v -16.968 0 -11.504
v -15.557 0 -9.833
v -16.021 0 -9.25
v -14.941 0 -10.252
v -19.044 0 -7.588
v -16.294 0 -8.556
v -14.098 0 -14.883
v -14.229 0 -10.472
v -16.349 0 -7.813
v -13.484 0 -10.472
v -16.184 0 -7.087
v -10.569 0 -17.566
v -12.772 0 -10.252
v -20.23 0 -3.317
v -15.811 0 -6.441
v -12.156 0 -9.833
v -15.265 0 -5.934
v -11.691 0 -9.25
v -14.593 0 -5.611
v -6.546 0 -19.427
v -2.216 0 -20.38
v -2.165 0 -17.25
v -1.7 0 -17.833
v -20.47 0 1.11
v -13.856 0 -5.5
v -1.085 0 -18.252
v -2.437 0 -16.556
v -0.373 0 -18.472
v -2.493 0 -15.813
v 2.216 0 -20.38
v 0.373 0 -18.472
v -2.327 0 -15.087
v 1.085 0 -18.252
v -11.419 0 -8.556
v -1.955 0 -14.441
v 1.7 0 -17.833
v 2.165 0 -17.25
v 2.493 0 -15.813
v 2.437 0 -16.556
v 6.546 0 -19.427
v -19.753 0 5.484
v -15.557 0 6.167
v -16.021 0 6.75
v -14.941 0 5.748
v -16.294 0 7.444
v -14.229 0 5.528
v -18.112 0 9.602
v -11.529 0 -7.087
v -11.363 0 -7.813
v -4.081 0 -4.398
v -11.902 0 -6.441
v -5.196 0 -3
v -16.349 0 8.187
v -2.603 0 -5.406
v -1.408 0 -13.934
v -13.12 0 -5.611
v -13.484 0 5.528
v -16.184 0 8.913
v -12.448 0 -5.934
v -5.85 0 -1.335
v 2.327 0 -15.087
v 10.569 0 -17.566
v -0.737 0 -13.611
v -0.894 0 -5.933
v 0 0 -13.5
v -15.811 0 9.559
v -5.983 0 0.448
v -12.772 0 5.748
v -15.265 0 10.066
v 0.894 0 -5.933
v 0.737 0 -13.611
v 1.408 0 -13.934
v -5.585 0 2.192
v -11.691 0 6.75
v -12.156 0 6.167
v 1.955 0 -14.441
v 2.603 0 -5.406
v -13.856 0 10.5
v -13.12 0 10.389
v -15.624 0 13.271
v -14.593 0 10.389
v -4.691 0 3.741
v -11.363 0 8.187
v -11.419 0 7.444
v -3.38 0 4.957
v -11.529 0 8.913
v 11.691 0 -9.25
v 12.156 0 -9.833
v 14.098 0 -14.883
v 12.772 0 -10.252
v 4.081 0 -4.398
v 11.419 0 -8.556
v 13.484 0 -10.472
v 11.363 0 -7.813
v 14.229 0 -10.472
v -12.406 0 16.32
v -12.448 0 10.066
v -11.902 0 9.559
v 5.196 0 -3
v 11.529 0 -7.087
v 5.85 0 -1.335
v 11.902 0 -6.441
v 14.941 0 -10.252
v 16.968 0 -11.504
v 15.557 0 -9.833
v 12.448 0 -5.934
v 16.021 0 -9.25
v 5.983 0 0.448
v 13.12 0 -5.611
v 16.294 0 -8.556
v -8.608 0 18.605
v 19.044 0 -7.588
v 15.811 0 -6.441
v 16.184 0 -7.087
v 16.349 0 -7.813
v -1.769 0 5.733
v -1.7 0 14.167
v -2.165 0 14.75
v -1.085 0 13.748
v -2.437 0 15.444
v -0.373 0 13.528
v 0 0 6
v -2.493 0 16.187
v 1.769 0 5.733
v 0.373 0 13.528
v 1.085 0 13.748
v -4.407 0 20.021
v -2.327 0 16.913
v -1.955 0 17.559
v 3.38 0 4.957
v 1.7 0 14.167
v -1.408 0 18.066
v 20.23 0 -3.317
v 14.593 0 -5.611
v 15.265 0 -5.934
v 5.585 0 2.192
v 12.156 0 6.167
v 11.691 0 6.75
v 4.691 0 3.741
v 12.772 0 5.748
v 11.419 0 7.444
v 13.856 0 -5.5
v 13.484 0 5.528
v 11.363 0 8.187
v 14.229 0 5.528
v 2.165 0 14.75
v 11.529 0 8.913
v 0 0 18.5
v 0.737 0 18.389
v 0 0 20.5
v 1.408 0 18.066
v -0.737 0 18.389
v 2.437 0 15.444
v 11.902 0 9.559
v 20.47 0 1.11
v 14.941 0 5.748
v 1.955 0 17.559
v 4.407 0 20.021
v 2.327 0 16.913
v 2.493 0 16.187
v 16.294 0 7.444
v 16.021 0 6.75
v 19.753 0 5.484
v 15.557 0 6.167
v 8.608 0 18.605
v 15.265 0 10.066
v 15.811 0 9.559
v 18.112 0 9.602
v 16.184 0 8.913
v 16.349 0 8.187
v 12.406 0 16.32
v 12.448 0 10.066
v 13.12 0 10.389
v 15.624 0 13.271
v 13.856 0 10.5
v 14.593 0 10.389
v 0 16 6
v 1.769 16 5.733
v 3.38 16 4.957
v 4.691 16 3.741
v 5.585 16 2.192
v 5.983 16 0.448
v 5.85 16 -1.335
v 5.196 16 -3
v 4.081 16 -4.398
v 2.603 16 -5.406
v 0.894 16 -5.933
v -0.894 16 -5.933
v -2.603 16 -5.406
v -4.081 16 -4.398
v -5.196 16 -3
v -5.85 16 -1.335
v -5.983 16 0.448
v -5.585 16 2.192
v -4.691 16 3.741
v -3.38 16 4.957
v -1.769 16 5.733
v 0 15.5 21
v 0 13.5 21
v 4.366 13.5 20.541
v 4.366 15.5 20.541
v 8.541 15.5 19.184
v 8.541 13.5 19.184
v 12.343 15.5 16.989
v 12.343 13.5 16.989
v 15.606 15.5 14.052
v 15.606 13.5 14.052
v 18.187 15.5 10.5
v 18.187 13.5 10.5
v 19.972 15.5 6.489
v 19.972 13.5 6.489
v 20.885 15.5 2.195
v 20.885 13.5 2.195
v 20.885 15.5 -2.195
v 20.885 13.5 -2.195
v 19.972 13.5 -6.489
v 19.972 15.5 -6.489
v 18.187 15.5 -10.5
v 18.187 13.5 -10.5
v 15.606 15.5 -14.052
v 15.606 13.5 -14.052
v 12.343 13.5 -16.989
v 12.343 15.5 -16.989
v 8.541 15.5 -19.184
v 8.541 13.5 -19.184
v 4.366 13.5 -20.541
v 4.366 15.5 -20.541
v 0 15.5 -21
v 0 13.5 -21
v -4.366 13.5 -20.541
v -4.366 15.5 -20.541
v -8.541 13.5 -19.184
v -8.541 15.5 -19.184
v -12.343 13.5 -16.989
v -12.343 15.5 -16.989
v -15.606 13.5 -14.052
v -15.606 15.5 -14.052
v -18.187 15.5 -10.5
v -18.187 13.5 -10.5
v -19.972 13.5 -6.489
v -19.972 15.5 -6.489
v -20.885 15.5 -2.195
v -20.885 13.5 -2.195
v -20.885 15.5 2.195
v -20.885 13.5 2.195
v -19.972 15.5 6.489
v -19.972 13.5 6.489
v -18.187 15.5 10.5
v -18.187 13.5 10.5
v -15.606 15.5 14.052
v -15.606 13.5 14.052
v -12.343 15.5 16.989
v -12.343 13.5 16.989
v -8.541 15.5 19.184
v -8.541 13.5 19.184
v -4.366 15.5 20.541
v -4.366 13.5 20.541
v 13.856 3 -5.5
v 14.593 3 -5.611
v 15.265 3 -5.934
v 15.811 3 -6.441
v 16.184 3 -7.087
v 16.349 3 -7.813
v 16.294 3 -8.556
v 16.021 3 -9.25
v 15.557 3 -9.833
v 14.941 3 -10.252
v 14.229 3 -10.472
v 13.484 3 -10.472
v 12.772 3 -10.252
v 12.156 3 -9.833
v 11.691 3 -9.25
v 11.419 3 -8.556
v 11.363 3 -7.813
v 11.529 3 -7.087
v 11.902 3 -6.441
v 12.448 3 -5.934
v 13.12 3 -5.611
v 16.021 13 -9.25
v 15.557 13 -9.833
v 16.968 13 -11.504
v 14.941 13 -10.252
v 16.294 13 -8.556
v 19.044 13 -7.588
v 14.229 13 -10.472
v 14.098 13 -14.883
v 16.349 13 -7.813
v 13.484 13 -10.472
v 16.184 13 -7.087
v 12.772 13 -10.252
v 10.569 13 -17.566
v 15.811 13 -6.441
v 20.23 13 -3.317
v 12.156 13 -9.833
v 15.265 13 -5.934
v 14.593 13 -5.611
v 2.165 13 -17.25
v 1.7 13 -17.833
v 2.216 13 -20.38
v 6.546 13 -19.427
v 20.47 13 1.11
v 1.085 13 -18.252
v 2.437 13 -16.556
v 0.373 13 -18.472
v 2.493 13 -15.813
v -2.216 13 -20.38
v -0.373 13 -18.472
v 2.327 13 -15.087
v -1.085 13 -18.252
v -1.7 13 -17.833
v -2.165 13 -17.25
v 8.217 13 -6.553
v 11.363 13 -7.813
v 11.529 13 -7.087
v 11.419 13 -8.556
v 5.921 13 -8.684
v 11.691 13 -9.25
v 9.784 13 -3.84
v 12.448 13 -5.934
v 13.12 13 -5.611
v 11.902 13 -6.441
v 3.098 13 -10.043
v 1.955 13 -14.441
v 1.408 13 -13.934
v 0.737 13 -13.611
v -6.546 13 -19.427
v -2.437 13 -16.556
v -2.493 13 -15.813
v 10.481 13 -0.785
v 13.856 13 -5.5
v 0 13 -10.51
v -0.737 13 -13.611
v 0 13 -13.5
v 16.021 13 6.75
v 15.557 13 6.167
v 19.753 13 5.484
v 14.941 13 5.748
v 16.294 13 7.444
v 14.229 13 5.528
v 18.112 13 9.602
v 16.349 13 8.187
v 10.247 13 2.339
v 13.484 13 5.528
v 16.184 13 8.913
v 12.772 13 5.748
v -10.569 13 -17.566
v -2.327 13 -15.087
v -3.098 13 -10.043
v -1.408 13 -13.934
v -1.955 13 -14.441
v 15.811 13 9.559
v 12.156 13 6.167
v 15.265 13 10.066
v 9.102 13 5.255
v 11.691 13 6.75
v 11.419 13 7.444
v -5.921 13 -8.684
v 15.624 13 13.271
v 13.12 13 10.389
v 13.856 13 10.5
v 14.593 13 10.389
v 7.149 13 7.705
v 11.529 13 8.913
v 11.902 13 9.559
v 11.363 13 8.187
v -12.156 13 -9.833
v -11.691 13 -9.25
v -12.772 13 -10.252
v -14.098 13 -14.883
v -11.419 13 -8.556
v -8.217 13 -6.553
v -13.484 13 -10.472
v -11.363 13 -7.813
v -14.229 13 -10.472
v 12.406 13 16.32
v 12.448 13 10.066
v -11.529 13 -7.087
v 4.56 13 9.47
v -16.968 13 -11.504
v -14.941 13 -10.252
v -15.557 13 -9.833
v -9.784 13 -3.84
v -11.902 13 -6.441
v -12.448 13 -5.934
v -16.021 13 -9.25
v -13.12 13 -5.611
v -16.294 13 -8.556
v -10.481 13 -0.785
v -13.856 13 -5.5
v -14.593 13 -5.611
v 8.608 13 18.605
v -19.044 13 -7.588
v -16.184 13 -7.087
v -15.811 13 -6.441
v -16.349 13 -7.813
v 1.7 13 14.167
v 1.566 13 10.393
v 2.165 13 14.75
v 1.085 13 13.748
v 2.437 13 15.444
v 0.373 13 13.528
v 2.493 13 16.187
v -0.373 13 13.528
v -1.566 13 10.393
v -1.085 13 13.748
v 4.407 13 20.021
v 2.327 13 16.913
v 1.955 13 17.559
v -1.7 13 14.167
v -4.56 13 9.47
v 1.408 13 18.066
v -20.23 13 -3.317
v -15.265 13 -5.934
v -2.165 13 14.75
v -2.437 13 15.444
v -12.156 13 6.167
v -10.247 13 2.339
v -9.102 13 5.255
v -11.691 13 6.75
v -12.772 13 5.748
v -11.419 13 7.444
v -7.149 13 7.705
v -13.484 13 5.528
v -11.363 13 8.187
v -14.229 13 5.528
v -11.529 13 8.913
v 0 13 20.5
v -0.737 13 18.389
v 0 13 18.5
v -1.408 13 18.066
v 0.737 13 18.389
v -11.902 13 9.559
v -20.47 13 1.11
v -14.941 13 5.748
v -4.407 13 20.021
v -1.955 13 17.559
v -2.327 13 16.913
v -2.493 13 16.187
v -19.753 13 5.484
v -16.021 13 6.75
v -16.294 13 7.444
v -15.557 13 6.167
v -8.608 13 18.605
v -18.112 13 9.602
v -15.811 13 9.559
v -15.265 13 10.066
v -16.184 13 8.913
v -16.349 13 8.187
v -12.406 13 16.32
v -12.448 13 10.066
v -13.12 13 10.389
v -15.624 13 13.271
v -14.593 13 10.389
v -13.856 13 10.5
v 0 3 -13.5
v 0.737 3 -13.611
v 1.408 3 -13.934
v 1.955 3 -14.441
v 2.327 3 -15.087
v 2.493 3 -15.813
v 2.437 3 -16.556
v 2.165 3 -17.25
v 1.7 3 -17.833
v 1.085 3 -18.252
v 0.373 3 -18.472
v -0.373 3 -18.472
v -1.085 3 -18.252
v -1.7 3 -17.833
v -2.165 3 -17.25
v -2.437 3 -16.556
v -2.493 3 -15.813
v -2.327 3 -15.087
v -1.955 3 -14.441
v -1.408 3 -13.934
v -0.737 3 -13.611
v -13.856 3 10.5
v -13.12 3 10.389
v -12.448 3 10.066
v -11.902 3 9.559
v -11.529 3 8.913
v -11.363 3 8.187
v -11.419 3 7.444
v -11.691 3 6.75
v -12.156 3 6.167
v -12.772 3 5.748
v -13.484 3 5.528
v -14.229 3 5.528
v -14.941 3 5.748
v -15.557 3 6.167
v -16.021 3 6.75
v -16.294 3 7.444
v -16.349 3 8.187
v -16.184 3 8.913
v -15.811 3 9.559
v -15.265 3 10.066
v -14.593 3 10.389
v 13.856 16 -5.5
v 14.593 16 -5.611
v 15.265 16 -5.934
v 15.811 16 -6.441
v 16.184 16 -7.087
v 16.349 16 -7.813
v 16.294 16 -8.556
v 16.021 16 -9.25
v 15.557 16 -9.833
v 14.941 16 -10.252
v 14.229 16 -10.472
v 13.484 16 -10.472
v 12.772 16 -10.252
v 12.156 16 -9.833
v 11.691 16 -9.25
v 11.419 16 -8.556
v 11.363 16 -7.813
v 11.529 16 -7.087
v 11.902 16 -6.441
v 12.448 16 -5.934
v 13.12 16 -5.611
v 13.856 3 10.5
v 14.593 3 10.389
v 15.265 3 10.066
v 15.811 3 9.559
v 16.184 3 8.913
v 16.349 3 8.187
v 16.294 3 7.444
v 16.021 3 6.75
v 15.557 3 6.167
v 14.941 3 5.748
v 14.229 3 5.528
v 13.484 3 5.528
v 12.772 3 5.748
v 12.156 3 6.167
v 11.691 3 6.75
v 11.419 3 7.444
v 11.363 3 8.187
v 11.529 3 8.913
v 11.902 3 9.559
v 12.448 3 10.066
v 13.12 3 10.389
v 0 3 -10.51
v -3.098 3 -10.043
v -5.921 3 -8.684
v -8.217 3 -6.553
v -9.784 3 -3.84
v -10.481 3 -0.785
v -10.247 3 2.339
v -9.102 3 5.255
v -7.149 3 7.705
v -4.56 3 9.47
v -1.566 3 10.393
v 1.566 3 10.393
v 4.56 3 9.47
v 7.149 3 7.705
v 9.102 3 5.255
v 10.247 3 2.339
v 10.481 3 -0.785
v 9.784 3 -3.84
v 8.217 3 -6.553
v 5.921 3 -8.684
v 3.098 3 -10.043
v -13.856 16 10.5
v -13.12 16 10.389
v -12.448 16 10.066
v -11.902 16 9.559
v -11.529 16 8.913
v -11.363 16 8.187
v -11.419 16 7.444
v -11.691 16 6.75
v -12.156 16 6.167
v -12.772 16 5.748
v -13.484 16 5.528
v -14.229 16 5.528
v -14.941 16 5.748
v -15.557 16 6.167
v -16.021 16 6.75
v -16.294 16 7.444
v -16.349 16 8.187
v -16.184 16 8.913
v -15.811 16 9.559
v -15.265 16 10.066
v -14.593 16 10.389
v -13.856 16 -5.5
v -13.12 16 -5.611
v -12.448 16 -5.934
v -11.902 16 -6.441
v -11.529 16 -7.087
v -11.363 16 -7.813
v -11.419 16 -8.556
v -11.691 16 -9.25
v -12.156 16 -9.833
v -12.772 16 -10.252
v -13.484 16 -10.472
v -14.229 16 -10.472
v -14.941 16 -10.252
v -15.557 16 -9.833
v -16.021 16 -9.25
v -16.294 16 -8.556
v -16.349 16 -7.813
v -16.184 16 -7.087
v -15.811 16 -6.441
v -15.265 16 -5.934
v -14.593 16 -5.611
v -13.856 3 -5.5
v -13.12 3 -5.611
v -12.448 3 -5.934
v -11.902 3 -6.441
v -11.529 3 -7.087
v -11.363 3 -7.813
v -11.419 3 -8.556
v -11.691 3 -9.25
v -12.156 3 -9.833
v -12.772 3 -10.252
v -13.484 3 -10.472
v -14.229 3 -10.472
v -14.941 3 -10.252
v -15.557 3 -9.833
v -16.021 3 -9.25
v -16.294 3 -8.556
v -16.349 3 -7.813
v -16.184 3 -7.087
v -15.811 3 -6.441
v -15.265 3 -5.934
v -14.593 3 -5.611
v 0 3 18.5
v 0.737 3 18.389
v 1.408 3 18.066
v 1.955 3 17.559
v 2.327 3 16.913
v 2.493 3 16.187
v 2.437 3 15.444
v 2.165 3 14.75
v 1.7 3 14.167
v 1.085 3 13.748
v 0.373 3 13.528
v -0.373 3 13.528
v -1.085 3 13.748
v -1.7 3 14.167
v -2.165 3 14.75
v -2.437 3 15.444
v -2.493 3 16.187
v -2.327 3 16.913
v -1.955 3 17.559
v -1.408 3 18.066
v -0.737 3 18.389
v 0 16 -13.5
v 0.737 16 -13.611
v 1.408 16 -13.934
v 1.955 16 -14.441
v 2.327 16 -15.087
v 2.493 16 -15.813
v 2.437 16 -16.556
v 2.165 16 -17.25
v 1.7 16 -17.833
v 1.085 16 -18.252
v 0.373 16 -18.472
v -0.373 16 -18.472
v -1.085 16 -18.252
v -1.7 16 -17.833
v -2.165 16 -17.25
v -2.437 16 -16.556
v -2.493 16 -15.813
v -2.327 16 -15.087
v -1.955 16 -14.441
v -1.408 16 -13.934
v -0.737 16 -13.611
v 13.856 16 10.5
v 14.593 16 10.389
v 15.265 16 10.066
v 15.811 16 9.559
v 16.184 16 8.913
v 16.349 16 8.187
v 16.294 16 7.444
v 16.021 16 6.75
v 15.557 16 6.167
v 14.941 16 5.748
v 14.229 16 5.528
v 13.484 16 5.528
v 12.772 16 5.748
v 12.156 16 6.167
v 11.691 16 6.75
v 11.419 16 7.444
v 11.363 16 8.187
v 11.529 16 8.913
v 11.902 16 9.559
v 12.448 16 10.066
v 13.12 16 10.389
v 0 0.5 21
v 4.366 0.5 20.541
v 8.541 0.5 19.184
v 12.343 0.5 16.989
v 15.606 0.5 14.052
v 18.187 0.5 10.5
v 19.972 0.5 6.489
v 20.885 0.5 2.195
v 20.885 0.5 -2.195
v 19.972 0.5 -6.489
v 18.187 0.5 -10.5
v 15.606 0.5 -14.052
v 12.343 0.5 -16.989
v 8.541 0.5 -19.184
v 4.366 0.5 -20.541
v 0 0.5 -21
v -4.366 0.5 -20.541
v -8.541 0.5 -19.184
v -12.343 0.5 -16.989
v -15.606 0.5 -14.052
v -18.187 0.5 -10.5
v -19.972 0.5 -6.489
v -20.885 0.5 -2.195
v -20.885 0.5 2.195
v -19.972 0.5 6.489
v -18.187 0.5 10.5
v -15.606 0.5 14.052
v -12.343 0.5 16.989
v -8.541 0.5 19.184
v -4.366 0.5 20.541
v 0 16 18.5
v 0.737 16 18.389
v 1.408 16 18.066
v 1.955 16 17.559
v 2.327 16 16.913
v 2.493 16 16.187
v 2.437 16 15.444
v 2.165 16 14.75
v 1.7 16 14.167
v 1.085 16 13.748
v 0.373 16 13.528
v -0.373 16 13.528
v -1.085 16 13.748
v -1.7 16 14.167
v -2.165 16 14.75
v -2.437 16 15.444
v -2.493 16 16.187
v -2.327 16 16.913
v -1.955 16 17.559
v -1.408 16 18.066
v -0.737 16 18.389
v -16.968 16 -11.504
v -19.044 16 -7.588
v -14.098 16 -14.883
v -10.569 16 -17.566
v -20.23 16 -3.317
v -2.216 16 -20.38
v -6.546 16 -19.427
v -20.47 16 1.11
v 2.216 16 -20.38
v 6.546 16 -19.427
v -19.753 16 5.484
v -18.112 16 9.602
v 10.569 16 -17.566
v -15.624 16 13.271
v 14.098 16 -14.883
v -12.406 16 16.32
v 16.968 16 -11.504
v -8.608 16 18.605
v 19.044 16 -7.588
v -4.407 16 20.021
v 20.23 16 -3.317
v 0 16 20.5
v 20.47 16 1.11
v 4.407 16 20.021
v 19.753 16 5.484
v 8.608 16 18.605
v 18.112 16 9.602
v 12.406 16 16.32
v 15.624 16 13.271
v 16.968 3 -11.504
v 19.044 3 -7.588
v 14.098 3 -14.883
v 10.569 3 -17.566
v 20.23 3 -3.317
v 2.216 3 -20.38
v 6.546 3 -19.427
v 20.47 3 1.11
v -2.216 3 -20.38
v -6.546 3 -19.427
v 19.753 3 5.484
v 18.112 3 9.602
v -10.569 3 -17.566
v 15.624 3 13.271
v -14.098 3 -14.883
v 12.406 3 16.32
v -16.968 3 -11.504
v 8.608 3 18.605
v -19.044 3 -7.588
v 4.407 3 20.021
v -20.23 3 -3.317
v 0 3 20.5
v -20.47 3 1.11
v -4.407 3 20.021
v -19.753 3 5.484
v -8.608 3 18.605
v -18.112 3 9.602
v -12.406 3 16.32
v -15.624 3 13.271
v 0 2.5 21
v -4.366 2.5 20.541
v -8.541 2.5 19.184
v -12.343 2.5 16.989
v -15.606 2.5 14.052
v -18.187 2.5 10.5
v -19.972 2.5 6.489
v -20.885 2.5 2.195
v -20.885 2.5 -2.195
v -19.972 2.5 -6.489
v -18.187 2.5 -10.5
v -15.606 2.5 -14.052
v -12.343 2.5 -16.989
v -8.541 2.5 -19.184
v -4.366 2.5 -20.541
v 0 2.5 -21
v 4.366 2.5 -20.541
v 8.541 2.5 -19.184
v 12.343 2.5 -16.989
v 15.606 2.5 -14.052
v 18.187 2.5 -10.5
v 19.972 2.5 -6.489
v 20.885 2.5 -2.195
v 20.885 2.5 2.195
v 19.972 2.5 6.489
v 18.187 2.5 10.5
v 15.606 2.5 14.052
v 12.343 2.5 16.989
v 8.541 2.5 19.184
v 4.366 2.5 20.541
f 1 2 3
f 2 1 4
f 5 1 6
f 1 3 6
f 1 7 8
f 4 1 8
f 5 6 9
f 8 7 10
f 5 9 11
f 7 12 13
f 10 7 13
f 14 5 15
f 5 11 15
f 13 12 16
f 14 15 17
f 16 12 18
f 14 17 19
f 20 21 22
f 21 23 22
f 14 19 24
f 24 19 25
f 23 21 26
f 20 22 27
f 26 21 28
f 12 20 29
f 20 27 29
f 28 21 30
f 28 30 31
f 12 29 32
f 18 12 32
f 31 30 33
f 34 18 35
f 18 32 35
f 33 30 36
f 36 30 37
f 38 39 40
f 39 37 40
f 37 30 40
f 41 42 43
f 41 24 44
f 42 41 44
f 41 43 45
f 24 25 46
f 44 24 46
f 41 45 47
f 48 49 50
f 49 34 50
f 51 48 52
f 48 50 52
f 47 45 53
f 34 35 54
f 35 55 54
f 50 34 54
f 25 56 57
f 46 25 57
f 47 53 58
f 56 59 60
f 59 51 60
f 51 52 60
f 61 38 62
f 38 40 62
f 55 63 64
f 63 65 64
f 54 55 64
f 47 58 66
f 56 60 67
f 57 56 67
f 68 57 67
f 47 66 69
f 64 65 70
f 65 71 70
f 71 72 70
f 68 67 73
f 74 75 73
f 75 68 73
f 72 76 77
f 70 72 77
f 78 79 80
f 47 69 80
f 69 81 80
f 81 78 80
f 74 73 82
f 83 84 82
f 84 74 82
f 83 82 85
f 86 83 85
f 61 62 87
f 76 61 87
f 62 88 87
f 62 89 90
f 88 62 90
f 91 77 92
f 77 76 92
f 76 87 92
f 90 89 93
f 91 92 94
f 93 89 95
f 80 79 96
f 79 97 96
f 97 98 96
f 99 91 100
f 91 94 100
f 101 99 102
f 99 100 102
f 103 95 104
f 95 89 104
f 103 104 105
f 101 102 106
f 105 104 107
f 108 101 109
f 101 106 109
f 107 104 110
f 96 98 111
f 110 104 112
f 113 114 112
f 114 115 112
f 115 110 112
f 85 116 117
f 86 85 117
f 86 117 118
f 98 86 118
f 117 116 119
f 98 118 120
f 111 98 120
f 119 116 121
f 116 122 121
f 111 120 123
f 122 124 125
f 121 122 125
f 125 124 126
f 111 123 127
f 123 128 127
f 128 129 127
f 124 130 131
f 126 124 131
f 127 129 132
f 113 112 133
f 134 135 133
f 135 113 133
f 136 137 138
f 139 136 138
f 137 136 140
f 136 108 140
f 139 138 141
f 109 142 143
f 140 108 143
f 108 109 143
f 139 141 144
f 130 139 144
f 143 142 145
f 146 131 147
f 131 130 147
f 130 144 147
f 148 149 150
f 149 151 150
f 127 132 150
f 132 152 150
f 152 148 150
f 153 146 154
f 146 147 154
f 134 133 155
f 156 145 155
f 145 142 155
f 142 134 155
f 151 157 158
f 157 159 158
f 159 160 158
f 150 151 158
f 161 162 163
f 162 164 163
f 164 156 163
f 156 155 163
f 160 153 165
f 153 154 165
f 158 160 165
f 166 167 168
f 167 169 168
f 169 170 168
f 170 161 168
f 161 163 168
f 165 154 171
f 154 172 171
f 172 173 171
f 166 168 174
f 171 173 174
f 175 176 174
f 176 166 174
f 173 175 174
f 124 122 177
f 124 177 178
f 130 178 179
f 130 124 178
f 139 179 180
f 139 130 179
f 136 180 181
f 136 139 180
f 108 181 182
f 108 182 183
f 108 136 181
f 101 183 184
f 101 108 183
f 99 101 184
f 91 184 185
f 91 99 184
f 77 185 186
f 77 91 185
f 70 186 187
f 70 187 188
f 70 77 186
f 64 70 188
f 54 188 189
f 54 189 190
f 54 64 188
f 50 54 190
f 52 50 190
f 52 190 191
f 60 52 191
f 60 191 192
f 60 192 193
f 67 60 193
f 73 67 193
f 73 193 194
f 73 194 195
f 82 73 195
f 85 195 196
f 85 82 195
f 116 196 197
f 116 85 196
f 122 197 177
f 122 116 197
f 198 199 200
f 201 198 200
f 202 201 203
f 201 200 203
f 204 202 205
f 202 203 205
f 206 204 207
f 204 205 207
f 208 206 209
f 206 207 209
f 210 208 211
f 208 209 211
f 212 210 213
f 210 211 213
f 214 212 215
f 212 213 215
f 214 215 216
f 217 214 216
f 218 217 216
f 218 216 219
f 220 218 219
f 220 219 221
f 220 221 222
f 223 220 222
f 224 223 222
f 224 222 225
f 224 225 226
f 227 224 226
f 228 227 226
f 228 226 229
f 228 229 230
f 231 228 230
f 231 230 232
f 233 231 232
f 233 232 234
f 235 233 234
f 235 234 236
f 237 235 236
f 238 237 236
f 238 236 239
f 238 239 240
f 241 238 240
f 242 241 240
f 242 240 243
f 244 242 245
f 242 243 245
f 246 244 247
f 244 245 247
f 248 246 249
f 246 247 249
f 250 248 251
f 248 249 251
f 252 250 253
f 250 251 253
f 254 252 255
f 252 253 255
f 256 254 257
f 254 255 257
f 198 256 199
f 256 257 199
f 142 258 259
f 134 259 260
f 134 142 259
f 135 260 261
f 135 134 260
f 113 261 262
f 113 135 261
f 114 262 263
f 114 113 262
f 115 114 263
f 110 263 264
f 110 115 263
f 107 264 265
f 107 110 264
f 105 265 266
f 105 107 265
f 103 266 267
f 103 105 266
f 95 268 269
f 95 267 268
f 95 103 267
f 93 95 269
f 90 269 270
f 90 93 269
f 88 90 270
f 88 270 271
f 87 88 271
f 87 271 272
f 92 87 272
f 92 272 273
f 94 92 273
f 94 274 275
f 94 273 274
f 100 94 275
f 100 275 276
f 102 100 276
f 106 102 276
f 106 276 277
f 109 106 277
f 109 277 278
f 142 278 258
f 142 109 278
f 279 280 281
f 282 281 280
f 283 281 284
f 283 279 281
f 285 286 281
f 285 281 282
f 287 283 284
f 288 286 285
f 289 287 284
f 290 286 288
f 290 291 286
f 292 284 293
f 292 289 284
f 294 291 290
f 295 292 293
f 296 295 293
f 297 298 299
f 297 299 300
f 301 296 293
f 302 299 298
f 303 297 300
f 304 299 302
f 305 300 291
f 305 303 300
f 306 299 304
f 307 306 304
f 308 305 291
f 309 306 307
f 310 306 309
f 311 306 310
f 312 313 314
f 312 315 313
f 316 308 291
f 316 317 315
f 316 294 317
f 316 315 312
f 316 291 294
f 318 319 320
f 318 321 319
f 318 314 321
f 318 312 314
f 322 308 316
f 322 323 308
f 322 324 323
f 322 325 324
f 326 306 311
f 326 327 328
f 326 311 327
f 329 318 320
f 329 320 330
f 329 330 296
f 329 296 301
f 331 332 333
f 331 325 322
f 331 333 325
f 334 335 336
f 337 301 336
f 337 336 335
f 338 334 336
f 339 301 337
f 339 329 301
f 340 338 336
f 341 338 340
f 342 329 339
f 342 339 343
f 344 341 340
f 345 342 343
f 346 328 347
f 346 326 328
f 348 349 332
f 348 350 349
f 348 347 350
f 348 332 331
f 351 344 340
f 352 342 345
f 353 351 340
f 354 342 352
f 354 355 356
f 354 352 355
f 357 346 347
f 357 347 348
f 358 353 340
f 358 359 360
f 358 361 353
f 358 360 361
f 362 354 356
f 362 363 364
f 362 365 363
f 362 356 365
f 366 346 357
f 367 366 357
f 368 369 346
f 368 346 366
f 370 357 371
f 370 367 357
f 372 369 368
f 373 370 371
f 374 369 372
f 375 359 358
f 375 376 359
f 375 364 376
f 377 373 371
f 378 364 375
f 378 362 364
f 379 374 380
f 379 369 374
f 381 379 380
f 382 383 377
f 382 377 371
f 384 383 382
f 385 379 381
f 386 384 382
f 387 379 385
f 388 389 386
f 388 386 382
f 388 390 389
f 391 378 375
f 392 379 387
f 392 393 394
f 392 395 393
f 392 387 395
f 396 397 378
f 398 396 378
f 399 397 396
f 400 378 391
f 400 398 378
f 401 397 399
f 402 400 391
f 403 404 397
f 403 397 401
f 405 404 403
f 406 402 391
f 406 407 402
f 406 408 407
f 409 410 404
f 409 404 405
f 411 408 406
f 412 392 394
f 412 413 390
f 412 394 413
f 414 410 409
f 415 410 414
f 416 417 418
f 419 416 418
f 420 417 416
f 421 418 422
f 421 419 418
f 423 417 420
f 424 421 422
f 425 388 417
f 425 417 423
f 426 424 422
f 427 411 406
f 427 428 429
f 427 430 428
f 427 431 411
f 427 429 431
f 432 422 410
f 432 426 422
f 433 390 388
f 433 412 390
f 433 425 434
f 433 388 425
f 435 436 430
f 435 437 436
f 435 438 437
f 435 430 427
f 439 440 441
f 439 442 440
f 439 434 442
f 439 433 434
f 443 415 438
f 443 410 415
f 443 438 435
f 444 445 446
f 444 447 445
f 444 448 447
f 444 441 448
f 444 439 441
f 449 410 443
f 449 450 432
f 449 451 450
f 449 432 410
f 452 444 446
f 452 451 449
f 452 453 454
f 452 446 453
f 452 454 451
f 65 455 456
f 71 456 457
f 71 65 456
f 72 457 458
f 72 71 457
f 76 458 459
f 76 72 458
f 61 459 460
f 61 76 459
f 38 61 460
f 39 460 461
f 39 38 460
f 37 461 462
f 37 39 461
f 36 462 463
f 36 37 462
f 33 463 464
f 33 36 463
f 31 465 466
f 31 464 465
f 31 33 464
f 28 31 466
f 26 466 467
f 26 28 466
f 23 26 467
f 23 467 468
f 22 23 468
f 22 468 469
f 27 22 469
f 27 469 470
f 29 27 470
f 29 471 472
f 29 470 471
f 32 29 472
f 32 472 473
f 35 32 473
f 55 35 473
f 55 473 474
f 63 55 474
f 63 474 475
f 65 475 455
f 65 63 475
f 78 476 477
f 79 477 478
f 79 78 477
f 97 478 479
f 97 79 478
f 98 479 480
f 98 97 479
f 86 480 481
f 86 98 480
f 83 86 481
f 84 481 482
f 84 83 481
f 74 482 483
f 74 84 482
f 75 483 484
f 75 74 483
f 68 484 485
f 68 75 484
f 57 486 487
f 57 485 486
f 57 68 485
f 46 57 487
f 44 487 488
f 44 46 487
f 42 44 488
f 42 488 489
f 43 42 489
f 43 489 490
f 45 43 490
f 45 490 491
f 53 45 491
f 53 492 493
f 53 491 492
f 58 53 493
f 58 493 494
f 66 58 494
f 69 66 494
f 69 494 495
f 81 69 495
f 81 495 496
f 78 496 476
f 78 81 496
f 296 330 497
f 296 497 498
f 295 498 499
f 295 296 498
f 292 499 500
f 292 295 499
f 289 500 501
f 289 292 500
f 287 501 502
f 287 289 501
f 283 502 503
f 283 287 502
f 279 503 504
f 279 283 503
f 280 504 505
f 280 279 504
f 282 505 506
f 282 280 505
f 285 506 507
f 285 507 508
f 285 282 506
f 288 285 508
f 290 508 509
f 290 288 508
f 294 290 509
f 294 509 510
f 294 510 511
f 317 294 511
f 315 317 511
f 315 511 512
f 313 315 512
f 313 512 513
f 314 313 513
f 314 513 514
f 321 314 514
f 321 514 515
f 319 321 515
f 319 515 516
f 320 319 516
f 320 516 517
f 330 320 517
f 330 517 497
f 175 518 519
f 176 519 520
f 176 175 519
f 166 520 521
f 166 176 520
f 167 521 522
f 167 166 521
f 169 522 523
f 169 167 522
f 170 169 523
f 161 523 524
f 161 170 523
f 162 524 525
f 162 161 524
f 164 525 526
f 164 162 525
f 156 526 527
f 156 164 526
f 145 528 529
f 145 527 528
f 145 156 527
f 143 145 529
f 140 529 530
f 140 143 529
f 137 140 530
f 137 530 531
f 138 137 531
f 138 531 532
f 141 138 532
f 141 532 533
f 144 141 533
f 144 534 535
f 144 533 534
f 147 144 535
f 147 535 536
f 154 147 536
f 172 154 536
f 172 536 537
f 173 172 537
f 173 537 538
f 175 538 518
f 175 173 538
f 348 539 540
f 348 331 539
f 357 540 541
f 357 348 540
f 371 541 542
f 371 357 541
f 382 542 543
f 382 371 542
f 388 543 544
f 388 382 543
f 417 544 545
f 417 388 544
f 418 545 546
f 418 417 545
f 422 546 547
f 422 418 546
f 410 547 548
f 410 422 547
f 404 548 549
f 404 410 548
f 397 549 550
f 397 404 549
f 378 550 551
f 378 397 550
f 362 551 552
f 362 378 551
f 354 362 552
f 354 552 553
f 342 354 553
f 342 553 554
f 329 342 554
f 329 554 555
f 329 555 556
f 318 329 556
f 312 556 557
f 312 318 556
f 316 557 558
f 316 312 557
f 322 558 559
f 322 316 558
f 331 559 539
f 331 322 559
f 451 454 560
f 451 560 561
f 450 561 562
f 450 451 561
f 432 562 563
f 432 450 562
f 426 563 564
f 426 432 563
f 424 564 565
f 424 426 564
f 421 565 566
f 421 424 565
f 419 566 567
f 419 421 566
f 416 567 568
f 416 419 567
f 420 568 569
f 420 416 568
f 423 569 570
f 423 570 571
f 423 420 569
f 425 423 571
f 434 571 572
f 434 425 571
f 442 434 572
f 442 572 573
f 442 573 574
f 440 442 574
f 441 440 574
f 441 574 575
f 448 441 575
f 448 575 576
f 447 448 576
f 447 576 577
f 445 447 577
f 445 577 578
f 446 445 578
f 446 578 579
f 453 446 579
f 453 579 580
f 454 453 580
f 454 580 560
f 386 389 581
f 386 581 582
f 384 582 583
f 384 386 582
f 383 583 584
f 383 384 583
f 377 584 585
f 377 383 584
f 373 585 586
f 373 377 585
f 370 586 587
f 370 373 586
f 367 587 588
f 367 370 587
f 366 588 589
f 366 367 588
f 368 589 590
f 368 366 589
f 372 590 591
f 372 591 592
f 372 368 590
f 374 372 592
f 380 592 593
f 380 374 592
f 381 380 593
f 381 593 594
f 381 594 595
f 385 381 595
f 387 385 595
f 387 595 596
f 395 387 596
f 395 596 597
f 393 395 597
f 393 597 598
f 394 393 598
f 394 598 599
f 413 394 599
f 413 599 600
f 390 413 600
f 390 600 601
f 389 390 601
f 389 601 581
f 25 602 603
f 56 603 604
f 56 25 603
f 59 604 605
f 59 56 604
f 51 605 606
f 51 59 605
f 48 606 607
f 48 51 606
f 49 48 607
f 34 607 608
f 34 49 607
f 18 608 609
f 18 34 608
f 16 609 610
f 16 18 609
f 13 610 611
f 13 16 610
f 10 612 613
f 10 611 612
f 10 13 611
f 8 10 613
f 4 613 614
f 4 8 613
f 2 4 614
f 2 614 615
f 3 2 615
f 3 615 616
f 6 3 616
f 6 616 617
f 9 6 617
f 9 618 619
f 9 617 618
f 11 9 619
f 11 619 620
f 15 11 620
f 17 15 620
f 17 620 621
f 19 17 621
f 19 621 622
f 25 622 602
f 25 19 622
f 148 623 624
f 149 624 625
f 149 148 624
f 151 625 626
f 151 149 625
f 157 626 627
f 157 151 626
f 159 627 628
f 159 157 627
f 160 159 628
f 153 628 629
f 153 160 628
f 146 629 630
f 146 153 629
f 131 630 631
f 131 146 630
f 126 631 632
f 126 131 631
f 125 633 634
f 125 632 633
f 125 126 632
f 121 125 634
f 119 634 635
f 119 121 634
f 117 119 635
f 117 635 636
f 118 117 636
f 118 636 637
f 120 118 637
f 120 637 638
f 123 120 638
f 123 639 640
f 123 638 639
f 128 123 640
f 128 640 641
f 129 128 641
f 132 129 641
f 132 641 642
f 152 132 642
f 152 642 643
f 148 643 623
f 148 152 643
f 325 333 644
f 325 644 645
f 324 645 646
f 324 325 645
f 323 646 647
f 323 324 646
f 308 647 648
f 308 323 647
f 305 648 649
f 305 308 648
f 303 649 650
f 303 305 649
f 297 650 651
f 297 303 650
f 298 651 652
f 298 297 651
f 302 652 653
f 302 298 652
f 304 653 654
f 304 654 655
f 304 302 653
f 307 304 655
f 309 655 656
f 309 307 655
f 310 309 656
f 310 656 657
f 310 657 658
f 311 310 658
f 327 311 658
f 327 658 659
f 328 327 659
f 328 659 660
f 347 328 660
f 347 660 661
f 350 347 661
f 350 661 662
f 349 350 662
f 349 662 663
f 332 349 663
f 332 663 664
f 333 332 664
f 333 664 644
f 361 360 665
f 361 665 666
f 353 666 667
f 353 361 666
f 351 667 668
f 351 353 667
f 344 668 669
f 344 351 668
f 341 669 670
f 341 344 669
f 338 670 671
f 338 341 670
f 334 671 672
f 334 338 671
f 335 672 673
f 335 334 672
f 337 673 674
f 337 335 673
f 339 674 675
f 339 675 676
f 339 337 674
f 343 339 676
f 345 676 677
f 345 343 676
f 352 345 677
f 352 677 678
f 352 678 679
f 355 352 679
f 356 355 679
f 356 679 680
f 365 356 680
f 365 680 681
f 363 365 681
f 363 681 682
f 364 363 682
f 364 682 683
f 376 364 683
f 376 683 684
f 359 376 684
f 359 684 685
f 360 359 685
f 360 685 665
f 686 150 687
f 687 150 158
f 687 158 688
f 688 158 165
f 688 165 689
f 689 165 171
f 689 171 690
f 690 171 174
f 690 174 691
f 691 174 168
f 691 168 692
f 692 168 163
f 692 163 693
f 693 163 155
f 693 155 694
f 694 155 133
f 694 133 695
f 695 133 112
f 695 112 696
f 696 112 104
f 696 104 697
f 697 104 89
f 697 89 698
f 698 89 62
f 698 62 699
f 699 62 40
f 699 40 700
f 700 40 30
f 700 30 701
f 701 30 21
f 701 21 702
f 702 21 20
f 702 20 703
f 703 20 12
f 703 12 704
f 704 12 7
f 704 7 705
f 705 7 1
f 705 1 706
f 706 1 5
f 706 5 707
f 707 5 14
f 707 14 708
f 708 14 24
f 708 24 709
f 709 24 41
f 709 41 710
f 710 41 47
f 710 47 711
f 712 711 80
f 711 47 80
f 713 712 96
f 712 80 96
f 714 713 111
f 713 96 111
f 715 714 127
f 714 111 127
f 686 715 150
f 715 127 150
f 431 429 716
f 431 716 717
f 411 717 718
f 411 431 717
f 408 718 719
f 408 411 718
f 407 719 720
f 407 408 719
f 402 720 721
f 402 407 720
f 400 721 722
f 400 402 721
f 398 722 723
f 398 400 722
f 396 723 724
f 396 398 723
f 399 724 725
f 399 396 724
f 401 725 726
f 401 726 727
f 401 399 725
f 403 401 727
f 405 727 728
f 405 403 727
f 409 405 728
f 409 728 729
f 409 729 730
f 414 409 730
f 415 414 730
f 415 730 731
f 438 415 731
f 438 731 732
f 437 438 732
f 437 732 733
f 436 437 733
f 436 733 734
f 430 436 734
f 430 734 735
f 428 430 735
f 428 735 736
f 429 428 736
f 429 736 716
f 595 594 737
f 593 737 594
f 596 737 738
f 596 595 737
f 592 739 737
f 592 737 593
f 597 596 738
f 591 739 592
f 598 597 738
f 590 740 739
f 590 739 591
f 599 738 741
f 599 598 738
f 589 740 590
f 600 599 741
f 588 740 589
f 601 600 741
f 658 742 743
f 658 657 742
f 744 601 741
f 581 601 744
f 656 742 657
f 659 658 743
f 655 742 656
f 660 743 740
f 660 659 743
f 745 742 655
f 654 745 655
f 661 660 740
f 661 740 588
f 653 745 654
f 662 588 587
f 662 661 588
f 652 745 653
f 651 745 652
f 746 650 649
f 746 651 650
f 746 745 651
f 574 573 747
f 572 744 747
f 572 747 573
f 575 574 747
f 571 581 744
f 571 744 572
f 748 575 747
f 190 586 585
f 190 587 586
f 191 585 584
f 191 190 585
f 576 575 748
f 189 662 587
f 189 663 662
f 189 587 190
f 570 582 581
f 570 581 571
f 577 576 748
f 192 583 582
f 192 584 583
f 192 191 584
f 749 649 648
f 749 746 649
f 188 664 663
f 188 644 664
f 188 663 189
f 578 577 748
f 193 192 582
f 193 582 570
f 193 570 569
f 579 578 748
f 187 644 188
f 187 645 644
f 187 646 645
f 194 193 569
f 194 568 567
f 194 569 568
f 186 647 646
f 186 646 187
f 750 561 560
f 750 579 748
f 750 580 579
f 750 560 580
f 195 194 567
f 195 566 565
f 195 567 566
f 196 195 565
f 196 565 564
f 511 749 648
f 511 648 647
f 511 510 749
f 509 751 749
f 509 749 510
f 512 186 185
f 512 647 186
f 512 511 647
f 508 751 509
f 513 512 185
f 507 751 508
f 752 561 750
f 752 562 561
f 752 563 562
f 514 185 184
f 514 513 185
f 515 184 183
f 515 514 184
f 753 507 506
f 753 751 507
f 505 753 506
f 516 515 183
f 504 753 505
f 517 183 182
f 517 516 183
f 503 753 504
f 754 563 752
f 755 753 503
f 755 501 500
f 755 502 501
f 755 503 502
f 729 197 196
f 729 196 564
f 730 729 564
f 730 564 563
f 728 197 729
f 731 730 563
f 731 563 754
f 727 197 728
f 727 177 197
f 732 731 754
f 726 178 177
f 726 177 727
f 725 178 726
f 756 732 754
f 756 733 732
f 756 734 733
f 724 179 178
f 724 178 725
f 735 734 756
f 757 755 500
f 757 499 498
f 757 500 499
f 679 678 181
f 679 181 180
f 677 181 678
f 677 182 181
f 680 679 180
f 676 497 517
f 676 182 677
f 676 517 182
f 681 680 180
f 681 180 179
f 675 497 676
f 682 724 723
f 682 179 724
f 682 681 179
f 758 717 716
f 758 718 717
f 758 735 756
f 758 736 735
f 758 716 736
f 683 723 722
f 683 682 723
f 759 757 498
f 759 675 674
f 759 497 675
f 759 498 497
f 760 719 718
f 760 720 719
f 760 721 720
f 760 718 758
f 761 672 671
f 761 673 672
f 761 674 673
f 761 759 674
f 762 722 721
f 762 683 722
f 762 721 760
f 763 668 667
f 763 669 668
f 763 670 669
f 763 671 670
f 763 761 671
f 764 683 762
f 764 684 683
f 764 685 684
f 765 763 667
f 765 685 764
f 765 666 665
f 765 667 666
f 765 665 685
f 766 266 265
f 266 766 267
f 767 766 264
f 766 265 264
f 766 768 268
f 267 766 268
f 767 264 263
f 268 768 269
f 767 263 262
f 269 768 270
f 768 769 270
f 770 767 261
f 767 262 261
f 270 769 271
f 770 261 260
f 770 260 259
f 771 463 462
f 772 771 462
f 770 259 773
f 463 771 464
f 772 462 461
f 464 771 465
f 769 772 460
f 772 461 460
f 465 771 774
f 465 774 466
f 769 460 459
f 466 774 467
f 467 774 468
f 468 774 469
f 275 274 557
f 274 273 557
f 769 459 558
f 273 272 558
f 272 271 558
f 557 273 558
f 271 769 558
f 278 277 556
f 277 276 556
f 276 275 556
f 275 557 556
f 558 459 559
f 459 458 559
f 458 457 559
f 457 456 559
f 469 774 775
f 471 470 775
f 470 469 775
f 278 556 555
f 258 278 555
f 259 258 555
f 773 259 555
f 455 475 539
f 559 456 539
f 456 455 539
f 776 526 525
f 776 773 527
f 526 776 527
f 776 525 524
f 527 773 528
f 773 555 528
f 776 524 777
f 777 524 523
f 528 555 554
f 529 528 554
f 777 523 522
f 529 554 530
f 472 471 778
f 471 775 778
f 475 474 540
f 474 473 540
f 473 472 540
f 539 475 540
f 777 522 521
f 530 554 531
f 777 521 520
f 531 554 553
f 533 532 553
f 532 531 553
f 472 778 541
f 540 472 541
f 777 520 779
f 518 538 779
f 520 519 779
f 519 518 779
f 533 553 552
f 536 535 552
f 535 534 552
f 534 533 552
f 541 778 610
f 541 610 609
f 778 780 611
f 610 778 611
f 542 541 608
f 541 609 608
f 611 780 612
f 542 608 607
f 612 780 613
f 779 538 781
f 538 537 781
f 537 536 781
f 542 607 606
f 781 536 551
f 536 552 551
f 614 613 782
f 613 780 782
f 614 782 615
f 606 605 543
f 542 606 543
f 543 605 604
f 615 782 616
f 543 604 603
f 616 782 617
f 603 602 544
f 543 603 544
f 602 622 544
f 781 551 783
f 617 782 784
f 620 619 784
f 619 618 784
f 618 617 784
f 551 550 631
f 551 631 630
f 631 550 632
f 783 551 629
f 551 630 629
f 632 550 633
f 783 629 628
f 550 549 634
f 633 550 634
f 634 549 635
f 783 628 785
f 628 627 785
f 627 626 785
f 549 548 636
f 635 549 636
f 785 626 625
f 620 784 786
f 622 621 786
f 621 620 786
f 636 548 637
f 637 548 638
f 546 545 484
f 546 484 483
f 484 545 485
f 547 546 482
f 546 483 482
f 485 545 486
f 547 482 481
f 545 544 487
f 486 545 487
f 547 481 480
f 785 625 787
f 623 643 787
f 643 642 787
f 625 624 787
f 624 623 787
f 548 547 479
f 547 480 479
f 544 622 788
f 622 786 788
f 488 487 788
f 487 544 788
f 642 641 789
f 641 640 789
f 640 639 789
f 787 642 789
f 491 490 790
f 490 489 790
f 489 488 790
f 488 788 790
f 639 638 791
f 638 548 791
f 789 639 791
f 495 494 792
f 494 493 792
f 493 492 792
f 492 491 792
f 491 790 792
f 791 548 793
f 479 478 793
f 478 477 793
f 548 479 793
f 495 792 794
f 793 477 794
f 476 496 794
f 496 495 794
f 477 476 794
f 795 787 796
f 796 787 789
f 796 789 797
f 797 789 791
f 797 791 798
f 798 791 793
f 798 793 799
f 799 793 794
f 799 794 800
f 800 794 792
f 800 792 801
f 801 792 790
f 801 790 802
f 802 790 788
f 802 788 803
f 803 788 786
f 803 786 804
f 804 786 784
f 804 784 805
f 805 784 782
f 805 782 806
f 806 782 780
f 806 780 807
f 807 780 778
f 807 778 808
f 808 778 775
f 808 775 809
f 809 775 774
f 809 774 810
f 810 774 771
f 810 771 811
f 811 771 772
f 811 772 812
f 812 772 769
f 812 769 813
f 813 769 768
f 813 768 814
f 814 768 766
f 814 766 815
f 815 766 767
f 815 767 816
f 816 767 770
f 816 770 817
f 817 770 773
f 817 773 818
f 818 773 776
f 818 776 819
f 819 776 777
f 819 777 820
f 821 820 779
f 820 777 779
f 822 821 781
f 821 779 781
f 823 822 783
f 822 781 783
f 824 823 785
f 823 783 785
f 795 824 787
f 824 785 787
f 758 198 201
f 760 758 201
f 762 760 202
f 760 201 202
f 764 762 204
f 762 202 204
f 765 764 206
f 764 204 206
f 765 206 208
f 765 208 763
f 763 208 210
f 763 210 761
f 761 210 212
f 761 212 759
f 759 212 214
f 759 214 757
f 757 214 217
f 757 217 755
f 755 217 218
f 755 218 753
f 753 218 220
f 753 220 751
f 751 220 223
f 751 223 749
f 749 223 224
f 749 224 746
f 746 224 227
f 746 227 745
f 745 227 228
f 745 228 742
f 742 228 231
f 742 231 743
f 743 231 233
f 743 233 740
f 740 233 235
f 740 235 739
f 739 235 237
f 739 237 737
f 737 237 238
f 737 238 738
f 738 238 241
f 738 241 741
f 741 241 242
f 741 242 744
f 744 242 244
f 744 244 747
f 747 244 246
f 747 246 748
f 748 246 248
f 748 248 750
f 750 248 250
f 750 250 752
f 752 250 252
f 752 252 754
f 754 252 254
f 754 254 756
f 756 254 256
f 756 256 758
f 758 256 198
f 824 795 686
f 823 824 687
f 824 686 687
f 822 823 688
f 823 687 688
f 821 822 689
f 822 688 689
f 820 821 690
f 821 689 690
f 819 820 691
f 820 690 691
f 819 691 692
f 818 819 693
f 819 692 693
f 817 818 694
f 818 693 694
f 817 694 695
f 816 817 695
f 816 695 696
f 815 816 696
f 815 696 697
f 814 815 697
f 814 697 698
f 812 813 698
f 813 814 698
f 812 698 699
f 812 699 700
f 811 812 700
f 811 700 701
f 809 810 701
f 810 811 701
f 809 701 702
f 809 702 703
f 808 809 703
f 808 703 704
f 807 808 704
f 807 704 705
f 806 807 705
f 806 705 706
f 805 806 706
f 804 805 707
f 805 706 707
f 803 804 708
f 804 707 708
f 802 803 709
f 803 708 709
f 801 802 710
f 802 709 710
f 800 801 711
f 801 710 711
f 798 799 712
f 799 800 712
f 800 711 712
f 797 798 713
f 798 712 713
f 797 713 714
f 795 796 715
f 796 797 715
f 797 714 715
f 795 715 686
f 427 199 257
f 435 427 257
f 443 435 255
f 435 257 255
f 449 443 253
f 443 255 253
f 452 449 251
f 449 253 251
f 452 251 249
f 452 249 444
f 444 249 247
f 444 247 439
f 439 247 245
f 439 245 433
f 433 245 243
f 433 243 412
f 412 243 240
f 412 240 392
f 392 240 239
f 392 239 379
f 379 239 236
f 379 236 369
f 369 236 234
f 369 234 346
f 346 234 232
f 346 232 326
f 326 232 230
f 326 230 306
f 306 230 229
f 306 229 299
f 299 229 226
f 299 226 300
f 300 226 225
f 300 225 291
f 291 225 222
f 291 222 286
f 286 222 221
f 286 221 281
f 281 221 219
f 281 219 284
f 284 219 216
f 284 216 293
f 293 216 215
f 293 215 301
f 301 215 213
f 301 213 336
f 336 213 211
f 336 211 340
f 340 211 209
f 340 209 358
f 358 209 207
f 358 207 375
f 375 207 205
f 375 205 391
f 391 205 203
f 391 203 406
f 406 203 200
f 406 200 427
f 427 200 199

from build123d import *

# Parameters (mm, degrees)
SKETCH1_R           = 21
SKETCH1_R_2         = 6
SKETCH1_R_3         = 2.5
BOSS_EXTRUDE1_DEPTH = 16
SKETCH2_W           = 19.556392274
SKETCH2_H           = 10
CHAMFER1_SIZE       = 0.5
CHAMFER2_SIZE       = 0.5


with BuildPart() as part:
    # Sketch1 → Boss-Extrude1 (new body)
    with BuildSketch(Plane(origin=(0, 0, 0), x_dir=(1, 0, 0), z_dir=(0, 1, 0))):
        with Locations(Location((0, 0, 0), (0, 0, 270))):
            Circle(SKETCH1_R)
        with Locations(Location((0, 0, 0), (0, 0, 270))):
            Circle(SKETCH1_R_2, mode=Mode.SUBTRACT)
        with Locations(Location((0, 16, 0), (0, 0, 270))):
            Circle(SKETCH1_R_3, mode=Mode.SUBTRACT)
        with Locations(Location((13.856406461, 8, 0), (0, 0, 270))):
            Circle(SKETCH1_R_3, mode=Mode.SUBTRACT)
        with Locations(Location((13.856406461, -8, 0), (0, 0, 270))):
            Circle(SKETCH1_R_3, mode=Mode.SUBTRACT)
        with Locations(Location((0, -16, 0), (0, 0, 270))):
            Circle(SKETCH1_R_3, mode=Mode.SUBTRACT)
        with Locations(Location((-13.856406461, -8, 0), (0, 0, 270))):
            Circle(SKETCH1_R_3, mode=Mode.SUBTRACT)
        with Locations(Location((-13.856406461, 8, 0), (0, 0, 270))):
            Circle(SKETCH1_R_3, mode=Mode.SUBTRACT)
    extrude(amount=BOSS_EXTRUDE1_DEPTH)

    # Sketch2 → Cut-Revolve1 (revolve, cut)
    with BuildSketch(Plane(origin=(0, 0, 0), x_dir=(0, 0, -1), z_dir=(1, 0, 0))):
        with Locations((20.288576043, 8)):
            Rectangle(SKETCH2_W, SKETCH2_H)
    revolve(axis=Axis((0, 0, 0), (0, 1, 0)), mode=Mode.SUBTRACT)

    # Chamfer1
    chamfer1_edges = [part.edges().sort_by_distance(p)[0] for p in [
        (0, 3, -21),
        (0, 13, -21),
    ]]
    chamfer(chamfer1_edges, length=CHAMFER1_SIZE)

    # Chamfer2
    chamfer2_edges = [part.edges().sort_by_distance(p)[0] for p in [
        (0, 0, -21),
        (0, 16, -21),
    ]]
    chamfer(chamfer2_edges, length=CHAMFER2_SIZE)


solid = part.part
